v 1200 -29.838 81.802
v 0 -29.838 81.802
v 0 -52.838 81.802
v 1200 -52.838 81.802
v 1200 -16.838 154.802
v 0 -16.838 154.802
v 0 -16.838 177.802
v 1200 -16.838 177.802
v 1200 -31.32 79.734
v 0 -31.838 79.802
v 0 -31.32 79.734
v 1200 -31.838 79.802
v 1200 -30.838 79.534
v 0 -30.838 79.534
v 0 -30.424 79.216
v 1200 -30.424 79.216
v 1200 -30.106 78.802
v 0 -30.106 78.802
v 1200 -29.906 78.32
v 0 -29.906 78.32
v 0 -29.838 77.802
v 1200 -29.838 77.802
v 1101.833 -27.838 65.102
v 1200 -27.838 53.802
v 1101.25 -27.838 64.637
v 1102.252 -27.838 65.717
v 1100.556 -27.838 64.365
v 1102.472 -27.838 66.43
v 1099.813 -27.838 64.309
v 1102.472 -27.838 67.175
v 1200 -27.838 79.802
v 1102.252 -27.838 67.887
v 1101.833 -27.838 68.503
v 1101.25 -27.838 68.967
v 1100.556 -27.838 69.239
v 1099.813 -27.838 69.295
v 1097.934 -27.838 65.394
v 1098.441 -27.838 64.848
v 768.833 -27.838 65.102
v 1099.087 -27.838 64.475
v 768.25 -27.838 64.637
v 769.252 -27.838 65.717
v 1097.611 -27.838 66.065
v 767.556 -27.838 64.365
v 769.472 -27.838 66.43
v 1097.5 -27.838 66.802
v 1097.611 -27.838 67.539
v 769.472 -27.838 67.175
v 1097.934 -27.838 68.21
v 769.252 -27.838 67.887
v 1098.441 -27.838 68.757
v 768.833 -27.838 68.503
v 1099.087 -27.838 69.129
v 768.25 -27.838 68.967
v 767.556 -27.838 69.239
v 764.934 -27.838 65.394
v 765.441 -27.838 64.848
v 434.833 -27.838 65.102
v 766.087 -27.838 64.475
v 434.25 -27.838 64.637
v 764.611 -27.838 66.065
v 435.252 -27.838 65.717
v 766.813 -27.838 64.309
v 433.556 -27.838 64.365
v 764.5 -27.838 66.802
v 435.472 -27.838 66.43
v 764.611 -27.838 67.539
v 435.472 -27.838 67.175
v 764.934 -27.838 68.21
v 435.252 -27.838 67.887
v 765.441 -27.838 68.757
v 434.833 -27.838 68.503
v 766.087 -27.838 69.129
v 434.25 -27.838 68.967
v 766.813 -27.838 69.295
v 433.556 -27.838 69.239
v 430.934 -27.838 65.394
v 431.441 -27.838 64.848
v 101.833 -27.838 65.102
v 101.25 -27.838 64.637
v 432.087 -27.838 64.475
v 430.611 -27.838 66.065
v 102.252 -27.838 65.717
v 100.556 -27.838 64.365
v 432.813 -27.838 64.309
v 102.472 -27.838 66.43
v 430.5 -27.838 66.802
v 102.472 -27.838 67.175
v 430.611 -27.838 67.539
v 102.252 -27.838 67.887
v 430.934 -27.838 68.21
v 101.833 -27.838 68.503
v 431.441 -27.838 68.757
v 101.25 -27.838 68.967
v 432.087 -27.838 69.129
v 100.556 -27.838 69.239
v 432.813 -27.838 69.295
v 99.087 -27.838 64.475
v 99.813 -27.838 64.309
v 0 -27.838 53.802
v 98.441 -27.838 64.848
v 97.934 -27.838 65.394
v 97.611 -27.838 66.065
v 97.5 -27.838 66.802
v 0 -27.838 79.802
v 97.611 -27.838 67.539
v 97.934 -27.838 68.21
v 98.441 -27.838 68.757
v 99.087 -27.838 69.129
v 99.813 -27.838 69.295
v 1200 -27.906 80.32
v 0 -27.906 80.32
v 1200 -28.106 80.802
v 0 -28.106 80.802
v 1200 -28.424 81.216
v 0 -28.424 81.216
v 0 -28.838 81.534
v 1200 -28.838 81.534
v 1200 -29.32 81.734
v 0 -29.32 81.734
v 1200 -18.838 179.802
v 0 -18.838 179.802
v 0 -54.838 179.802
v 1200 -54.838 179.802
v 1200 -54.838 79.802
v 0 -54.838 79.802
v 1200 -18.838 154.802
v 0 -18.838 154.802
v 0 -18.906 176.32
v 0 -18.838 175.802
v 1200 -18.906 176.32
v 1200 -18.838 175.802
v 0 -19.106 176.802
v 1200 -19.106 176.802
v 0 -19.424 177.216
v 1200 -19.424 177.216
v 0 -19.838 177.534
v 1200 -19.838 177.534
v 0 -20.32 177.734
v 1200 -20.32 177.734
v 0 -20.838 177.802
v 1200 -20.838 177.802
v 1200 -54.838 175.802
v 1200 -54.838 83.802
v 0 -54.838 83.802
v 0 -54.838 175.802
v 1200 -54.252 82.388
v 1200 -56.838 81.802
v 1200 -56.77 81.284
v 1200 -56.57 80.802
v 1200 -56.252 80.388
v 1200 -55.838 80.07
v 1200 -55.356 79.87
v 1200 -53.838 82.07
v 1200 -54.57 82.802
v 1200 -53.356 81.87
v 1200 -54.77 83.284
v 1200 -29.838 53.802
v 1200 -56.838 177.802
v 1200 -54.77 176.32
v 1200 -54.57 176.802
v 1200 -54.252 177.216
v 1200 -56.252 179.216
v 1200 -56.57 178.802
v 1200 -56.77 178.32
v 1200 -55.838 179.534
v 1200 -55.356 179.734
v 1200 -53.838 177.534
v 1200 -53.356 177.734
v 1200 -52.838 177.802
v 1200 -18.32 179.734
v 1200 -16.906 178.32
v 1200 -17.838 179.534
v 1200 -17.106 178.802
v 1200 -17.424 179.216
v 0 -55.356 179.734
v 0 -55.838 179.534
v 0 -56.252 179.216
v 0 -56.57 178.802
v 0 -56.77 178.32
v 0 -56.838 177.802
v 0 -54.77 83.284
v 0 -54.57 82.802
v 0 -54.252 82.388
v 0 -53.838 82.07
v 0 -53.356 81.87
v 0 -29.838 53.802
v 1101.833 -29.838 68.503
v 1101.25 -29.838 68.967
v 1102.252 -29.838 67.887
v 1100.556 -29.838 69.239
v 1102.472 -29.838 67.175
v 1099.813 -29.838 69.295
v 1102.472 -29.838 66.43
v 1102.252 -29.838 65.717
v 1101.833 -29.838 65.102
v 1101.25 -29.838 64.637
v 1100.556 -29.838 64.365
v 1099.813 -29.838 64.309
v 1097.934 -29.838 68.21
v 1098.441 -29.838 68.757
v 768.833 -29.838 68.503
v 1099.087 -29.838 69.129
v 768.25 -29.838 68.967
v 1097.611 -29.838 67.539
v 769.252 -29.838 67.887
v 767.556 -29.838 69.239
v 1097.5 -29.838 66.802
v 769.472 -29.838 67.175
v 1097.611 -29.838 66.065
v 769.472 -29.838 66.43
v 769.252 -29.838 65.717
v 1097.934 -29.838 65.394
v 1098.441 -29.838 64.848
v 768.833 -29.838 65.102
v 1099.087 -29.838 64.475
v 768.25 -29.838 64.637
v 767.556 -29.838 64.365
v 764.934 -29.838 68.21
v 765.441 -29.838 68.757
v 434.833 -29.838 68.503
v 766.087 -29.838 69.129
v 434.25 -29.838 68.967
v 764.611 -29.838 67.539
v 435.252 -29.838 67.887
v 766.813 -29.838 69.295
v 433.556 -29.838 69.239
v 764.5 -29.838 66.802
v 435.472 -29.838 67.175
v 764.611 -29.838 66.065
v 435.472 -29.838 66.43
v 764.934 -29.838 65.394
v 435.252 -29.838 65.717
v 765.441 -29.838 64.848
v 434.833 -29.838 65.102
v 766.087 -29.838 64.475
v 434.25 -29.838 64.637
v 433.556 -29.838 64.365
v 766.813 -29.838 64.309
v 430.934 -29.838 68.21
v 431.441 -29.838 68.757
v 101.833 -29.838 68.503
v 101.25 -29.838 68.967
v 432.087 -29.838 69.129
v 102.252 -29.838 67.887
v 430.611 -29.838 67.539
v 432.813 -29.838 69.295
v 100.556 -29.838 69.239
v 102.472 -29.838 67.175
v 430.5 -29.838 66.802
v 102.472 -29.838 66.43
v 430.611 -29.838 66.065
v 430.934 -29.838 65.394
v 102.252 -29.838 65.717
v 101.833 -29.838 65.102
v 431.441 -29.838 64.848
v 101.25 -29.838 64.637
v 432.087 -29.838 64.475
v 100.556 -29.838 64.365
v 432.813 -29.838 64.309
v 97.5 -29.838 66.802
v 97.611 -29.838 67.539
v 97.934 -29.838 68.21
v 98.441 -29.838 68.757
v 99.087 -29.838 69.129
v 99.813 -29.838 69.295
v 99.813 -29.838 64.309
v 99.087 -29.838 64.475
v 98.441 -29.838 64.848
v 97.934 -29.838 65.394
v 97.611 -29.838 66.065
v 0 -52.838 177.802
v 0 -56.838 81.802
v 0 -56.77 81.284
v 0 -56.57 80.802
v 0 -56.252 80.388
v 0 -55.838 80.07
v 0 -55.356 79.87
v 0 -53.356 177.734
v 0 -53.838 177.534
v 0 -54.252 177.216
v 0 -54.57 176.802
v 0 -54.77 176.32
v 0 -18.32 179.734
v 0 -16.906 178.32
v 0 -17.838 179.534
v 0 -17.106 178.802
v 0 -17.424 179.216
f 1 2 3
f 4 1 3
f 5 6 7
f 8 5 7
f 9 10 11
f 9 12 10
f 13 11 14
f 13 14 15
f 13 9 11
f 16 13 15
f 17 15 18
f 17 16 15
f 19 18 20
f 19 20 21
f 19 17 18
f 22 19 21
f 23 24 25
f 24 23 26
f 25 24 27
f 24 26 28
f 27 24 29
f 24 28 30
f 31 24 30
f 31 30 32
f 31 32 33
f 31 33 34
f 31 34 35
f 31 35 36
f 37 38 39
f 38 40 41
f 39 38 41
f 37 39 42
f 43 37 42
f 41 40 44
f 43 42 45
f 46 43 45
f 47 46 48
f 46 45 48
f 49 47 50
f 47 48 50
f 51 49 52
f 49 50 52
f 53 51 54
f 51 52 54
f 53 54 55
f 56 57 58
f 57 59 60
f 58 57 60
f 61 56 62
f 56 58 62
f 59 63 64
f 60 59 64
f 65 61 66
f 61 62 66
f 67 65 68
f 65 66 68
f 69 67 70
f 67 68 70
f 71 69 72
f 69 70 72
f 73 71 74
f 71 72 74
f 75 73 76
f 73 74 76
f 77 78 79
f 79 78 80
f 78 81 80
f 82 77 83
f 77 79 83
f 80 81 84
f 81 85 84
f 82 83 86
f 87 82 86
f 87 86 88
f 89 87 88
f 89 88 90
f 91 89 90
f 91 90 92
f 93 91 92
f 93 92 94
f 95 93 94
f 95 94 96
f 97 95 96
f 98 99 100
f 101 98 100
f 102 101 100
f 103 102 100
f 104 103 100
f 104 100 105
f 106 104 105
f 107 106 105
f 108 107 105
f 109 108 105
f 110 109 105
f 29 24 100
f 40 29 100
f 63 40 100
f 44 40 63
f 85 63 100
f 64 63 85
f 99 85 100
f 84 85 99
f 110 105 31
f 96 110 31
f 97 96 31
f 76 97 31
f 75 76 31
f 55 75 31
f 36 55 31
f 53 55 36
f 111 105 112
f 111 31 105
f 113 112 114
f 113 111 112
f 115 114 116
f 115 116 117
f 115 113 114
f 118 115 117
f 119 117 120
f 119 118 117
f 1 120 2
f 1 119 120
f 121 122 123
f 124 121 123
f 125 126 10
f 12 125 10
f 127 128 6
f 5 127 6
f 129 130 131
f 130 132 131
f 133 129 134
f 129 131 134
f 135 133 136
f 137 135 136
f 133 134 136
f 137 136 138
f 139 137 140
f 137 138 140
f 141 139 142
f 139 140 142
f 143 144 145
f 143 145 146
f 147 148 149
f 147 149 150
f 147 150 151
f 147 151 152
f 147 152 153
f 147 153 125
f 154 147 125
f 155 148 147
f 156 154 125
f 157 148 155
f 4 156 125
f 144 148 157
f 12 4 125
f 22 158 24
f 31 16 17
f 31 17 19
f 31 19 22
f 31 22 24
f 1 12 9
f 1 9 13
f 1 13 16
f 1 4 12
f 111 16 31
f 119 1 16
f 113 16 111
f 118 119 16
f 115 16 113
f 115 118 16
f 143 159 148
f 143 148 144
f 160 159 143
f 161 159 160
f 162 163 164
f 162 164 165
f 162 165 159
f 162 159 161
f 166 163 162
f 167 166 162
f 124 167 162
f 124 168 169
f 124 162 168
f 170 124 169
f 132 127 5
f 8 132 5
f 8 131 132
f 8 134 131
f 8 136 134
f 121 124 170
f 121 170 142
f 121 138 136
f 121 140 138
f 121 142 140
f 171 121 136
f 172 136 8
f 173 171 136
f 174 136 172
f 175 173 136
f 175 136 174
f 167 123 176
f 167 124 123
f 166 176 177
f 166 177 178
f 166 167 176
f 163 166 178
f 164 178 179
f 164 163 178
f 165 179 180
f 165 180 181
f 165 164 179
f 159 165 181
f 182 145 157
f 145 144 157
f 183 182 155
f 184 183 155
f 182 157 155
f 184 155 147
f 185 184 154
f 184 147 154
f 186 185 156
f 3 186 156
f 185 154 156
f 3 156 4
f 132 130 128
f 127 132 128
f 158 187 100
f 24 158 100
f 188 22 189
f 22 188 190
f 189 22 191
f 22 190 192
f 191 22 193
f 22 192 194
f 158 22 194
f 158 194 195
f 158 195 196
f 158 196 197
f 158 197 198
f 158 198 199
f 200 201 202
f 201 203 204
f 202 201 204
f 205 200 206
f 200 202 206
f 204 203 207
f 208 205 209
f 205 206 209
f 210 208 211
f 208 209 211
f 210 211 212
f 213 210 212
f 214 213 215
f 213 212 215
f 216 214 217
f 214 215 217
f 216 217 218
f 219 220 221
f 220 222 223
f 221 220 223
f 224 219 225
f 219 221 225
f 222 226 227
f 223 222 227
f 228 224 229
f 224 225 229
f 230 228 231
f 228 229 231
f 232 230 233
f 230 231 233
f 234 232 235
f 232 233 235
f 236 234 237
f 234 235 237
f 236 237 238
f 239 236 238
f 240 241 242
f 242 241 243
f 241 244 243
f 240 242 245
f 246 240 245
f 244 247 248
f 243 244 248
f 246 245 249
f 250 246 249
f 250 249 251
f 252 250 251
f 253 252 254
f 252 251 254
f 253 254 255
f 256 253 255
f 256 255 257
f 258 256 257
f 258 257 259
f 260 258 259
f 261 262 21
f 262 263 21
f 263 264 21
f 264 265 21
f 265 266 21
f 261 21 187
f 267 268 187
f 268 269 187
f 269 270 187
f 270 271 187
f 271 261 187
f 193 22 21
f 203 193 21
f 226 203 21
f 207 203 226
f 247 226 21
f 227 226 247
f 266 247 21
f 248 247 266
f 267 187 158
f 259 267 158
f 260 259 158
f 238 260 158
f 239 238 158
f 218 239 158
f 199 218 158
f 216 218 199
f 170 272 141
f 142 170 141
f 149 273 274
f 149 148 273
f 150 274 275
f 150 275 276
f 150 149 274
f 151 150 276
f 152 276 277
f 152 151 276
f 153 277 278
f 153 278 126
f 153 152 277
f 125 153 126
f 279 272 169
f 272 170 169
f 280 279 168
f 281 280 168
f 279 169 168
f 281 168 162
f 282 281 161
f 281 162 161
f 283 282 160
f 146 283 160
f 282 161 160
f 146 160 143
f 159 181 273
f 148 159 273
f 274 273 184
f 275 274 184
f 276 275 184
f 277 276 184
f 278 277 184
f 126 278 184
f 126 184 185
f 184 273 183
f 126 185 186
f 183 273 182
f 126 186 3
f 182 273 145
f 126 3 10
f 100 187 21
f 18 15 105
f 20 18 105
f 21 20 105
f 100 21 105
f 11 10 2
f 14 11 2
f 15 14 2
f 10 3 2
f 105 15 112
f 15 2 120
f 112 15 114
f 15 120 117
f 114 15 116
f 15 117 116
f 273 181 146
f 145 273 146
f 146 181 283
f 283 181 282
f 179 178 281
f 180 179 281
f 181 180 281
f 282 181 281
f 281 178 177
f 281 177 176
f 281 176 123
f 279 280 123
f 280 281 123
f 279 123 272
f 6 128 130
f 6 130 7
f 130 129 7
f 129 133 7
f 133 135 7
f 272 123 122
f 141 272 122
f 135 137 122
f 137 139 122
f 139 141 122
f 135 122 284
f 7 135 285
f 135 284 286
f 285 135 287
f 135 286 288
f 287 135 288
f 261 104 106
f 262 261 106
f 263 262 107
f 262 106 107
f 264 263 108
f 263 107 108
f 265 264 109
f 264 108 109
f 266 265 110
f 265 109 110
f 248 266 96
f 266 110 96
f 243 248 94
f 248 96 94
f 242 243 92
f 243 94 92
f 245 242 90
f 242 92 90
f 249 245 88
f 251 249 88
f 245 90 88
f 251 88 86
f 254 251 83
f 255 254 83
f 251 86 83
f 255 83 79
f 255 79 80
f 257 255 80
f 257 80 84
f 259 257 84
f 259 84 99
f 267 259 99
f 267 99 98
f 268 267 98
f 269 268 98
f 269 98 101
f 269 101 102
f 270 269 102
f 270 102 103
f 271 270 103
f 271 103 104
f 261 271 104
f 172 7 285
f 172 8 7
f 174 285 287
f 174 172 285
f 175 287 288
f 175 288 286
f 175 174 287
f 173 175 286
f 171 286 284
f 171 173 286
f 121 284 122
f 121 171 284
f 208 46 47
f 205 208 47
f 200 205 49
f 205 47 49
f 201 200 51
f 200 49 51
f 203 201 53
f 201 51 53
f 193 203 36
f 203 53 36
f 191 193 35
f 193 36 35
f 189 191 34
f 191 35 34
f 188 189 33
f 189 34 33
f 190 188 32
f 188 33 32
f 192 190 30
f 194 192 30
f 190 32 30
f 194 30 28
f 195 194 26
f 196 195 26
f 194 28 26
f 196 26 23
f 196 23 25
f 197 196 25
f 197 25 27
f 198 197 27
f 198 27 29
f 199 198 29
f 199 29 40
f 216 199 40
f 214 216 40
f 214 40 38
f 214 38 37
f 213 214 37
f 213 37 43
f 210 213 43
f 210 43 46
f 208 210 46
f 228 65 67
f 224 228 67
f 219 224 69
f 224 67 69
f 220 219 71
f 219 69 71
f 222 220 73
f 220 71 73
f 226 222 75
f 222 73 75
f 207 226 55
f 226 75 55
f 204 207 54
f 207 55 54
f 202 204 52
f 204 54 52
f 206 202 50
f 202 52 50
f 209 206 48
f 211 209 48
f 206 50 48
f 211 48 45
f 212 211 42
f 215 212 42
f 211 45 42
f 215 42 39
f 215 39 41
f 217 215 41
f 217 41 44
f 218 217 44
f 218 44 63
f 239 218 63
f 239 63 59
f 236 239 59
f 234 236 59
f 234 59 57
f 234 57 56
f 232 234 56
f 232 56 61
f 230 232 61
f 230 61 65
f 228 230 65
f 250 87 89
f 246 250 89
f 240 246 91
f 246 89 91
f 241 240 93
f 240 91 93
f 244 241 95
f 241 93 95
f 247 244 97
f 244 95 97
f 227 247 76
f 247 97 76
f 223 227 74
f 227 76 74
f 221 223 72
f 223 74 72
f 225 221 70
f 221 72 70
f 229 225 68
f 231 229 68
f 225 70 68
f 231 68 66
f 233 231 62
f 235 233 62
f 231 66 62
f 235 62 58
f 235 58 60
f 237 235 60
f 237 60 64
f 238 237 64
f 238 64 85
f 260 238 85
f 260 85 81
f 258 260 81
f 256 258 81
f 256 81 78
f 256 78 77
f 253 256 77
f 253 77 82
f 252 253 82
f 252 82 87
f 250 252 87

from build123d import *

# Parameters (mm, degrees)
F1_DEPTH = 1200
F3_D     = 5
F4_R     = 2


# Not quite as in the source:
# - a feature names something its author has since deleted; it is built from what else it names


with BuildPart() as f1:
    # F0 (on Right) → F1 (new body)
    with BuildSketch(Plane.YZ):
        Polygon((-18.8378913403, 177.8021101952), (-18.8378913403, 154.8021101952), (-16.8378913403, 154.8021101952), (-16.8378913403, 179.8021101952), (-56.8378913403, 179.8021101952), (-56.8378913403, 79.8021101952), (-29.8378913403, 79.8021101952), (-29.8378913403, 53.8021101952), (-27.8378913403, 53.8021101952), (-27.8378913403, 81.8021101952), (-54.8378913403, 81.8021101952), (-54.8378913403, 177.8021101952), align=None)
    extrude(amount=F1_DEPTH)

    # F3 (through all)
    with Locations(Plane.XZ.offset(29.8378913403)):
        with Locations((433, 66.8021101952), (767, 66.8021101952), (1100, 66.8021101952), (100, 66.8021101952)):
            Hole(F3_D / 2)

    # F4
    f4_edges = [f1.edges().sort_by_distance(p)[0] for p in [
        (600, -56.837891, 179.80211),
        (600, -16.837891, 179.80211),
        (600, -56.837891, 79.80211),
        (600, -27.837891, 81.80211),
        (600, -54.837891, 81.80211),
        (600, -29.837891, 79.80211),
        (600, -18.837891, 177.80211),
        (600, -54.837891, 177.80211),
    ]]
    fillet(f4_edges, radius=F4_R)


solid = f1.part
